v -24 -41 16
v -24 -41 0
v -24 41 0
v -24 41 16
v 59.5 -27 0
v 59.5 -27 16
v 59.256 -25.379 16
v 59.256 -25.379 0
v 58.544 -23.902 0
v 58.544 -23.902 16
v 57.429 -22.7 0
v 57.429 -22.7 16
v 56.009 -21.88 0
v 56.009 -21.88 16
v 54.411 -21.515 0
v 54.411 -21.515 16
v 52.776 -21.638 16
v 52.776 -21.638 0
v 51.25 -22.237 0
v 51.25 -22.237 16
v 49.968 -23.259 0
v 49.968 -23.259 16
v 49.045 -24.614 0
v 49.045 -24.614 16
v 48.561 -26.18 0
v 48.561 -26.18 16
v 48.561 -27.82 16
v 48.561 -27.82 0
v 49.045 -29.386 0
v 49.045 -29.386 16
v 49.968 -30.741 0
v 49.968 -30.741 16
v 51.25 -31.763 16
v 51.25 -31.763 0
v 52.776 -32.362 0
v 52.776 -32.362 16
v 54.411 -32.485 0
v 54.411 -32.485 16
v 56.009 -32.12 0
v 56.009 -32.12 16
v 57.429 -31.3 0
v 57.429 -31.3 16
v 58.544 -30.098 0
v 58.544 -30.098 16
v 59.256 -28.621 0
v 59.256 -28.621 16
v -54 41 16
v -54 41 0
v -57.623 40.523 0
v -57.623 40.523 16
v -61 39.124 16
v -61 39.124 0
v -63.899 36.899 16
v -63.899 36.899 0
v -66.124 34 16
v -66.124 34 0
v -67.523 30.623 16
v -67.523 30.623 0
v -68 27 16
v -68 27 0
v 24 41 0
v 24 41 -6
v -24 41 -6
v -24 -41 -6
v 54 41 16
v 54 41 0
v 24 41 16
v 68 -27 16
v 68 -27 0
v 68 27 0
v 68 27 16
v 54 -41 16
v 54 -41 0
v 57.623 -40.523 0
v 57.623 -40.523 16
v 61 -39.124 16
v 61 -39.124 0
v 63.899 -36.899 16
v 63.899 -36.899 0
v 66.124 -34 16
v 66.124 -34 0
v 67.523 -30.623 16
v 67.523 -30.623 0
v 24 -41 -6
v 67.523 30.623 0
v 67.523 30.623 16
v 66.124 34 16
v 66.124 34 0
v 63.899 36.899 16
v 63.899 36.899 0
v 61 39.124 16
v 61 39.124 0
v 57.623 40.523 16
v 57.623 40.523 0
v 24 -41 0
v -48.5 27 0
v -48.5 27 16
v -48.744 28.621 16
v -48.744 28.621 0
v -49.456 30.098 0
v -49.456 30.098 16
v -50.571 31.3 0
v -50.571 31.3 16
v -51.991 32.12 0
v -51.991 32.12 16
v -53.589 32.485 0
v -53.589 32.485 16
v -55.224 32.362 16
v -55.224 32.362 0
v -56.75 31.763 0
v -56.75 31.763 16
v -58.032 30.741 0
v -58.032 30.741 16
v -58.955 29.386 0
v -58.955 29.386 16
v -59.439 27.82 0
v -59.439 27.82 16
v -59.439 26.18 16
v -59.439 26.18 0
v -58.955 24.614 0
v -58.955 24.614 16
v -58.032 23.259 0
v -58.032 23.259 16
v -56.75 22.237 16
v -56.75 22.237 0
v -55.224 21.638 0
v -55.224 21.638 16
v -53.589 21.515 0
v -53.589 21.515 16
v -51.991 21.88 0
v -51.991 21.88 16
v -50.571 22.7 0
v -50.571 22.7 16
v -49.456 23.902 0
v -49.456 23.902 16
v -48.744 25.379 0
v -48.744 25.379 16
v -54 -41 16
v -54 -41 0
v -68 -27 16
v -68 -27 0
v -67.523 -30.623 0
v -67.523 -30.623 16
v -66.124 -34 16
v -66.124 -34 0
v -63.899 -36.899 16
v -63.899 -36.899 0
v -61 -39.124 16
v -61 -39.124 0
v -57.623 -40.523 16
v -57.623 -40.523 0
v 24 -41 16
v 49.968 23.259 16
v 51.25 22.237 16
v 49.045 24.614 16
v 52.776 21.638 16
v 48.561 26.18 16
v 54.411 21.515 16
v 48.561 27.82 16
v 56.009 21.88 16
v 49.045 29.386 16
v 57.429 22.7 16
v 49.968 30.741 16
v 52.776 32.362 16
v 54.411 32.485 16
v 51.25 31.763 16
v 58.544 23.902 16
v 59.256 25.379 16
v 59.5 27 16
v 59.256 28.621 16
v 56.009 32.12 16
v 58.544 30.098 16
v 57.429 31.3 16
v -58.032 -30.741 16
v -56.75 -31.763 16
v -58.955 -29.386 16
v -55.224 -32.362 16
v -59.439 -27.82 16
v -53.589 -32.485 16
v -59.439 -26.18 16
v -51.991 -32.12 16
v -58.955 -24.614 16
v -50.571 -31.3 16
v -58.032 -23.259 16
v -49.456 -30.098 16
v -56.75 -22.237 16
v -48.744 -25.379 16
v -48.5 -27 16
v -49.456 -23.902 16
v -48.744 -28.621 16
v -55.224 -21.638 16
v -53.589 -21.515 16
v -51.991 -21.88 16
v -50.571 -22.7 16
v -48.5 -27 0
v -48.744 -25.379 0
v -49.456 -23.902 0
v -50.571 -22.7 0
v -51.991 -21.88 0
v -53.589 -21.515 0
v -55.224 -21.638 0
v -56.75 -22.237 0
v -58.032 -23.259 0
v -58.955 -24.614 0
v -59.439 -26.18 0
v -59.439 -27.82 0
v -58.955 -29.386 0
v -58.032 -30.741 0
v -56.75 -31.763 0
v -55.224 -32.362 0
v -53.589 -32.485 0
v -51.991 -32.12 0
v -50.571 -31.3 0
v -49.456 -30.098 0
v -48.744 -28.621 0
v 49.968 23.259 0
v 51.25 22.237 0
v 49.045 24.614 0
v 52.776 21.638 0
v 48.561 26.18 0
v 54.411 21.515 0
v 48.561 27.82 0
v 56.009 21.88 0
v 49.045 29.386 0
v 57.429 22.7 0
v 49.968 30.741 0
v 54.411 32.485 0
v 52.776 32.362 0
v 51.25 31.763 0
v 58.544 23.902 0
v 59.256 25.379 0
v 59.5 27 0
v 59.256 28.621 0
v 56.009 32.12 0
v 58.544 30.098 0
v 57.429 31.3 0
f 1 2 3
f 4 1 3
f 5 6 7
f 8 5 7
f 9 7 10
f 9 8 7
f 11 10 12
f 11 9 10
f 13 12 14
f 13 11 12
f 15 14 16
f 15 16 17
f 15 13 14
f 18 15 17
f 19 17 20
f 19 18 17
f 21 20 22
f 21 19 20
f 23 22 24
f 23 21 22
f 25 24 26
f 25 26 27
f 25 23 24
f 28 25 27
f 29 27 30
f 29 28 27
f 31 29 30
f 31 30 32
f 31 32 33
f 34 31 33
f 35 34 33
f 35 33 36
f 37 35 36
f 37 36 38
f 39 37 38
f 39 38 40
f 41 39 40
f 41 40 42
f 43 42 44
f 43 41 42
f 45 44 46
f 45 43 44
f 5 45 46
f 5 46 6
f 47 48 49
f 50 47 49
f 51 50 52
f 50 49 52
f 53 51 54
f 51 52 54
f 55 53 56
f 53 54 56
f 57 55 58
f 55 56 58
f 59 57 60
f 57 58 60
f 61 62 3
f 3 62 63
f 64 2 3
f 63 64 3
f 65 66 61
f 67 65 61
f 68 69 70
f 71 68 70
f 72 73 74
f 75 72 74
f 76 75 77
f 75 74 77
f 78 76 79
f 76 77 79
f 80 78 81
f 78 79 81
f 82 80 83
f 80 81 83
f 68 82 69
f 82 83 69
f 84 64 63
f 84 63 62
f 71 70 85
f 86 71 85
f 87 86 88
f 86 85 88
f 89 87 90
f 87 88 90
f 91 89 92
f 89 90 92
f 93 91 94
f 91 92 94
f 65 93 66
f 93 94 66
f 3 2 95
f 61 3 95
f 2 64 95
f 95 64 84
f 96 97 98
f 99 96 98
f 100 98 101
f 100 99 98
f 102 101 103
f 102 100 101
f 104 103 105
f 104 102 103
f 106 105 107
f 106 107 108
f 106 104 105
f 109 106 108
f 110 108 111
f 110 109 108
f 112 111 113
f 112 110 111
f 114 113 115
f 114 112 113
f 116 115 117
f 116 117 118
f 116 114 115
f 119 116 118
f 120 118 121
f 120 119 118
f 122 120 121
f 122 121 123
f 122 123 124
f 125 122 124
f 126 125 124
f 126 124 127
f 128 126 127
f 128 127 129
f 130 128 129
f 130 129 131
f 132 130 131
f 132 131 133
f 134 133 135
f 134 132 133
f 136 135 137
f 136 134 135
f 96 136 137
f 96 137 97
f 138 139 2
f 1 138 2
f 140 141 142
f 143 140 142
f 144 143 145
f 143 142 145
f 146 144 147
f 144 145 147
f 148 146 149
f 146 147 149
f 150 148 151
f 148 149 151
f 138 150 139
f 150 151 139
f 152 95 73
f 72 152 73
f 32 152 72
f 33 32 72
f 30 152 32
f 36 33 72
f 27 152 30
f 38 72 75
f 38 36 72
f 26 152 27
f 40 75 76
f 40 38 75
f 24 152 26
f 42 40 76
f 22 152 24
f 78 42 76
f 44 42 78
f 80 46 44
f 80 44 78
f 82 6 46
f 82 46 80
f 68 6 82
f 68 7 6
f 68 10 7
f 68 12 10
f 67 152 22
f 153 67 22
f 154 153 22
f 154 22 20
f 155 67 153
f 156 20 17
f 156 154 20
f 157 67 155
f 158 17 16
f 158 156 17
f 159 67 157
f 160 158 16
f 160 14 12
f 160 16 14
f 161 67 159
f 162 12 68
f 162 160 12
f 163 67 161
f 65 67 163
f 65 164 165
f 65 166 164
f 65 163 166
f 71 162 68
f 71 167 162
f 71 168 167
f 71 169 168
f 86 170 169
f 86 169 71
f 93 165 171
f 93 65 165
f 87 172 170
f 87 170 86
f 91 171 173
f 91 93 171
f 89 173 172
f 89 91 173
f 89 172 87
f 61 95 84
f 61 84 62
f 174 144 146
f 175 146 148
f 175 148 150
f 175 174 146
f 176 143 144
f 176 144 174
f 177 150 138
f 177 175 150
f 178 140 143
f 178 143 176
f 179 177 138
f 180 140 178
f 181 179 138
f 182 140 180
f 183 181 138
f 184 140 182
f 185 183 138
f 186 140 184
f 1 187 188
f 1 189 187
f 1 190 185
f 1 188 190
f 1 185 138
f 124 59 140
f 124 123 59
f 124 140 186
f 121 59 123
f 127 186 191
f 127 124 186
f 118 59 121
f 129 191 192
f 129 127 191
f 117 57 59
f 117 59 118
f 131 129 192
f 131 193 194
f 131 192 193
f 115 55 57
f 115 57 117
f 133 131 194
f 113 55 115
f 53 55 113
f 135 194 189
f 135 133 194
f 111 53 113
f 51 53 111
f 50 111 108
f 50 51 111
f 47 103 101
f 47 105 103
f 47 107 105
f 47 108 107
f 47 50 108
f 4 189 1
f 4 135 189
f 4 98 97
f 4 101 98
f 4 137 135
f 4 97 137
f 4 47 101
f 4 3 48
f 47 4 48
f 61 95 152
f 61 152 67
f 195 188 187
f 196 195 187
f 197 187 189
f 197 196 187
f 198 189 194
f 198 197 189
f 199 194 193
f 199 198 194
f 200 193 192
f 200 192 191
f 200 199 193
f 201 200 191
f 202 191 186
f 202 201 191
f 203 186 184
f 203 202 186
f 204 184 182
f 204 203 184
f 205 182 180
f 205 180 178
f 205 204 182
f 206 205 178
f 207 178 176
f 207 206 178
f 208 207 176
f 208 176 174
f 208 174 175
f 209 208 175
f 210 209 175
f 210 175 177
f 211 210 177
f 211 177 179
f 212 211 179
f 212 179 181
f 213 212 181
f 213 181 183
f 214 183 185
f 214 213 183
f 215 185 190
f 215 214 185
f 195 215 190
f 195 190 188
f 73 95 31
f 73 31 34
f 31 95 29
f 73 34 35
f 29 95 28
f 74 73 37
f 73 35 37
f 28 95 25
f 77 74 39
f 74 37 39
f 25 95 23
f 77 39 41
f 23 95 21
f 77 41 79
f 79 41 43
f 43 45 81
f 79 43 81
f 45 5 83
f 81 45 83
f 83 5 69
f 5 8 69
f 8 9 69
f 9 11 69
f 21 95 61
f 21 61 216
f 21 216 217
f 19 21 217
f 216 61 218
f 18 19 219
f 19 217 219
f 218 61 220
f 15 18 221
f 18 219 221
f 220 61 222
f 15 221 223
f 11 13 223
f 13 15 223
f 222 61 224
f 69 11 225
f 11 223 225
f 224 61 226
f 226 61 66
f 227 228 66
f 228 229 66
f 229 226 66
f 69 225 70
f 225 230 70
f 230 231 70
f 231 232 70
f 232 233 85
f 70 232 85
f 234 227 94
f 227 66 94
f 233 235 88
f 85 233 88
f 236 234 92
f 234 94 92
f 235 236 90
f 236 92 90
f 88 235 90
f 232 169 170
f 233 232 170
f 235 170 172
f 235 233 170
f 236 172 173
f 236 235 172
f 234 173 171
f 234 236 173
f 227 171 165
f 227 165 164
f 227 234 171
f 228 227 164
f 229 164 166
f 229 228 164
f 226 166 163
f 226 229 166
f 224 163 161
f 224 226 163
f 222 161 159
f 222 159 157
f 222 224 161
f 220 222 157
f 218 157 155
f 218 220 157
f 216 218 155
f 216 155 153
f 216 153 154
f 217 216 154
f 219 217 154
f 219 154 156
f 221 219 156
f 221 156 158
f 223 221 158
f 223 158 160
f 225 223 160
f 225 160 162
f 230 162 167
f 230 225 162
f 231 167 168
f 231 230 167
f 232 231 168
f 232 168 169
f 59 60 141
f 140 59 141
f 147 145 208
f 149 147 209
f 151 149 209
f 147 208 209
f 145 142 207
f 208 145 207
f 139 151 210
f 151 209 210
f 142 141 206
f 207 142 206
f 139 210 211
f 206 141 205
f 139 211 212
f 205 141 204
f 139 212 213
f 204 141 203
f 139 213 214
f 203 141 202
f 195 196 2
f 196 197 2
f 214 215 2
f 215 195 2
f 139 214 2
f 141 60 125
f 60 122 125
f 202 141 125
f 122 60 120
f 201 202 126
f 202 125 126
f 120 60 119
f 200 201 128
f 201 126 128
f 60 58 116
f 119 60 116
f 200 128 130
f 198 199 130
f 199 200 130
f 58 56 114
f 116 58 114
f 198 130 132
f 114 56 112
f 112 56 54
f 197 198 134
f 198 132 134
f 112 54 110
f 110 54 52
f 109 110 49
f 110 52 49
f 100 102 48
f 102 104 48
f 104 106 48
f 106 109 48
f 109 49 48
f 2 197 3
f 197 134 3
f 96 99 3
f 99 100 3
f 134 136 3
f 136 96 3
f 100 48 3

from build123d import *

# Parameters (mm, degrees)
F0_R     = 5.5
F1_DEPTH = 16
F2_W     = 48
F2_H     = 82
F3_DEPTH = 6
F4_W     = 48
F4_H     = 82
F5_DEPTH = 16


with BuildPart() as f1:
    # F0 (on Top) → F1 (new body)
    with BuildSketch(Plane.XY):
        with BuildLine():
            Line((-54, -41), (54, -41))
            ThreePointArc((54, -41), (63.899495, -36.899495), (68, -27))
            Line((68, -27), (68, 27))
            ThreePointArc((68, 27), (63.899495, 36.899495), (54, 41))
            Line((54, 41), (-54, 41))
            ThreePointArc((-54, 41), (-63.899495, 36.899495), (-68, 27))
            Line((-68, 27), (-68, -27))
            ThreePointArc((-68, -27), (-63.899495, -36.899495), (-54, -41))
        make_face()
        with Locations((-54, -27)):
            Circle(F0_R, mode=Mode.SUBTRACT)
        with Locations((54, -27)):
            Circle(F0_R, mode=Mode.SUBTRACT)
        with Locations((-54, 27)):
            Circle(F0_R, mode=Mode.SUBTRACT)
        with Locations((54, 27)):
            Circle(F0_R, mode=Mode.SUBTRACT)
    extrude(amount=F1_DEPTH)

    # F2 (on Top) → F3 (join)
    with BuildSketch(Plane.XY):
        Rectangle(F2_W, F2_H)
    extrude(amount=-F3_DEPTH)

    # F4 (on Top) → F5 (cut, through all)
    with BuildSketch(Plane.XY):
        Rectangle(F4_W, F4_H)
    extrude(amount=F5_DEPTH, mode=Mode.SUBTRACT)


solid = f1.part
